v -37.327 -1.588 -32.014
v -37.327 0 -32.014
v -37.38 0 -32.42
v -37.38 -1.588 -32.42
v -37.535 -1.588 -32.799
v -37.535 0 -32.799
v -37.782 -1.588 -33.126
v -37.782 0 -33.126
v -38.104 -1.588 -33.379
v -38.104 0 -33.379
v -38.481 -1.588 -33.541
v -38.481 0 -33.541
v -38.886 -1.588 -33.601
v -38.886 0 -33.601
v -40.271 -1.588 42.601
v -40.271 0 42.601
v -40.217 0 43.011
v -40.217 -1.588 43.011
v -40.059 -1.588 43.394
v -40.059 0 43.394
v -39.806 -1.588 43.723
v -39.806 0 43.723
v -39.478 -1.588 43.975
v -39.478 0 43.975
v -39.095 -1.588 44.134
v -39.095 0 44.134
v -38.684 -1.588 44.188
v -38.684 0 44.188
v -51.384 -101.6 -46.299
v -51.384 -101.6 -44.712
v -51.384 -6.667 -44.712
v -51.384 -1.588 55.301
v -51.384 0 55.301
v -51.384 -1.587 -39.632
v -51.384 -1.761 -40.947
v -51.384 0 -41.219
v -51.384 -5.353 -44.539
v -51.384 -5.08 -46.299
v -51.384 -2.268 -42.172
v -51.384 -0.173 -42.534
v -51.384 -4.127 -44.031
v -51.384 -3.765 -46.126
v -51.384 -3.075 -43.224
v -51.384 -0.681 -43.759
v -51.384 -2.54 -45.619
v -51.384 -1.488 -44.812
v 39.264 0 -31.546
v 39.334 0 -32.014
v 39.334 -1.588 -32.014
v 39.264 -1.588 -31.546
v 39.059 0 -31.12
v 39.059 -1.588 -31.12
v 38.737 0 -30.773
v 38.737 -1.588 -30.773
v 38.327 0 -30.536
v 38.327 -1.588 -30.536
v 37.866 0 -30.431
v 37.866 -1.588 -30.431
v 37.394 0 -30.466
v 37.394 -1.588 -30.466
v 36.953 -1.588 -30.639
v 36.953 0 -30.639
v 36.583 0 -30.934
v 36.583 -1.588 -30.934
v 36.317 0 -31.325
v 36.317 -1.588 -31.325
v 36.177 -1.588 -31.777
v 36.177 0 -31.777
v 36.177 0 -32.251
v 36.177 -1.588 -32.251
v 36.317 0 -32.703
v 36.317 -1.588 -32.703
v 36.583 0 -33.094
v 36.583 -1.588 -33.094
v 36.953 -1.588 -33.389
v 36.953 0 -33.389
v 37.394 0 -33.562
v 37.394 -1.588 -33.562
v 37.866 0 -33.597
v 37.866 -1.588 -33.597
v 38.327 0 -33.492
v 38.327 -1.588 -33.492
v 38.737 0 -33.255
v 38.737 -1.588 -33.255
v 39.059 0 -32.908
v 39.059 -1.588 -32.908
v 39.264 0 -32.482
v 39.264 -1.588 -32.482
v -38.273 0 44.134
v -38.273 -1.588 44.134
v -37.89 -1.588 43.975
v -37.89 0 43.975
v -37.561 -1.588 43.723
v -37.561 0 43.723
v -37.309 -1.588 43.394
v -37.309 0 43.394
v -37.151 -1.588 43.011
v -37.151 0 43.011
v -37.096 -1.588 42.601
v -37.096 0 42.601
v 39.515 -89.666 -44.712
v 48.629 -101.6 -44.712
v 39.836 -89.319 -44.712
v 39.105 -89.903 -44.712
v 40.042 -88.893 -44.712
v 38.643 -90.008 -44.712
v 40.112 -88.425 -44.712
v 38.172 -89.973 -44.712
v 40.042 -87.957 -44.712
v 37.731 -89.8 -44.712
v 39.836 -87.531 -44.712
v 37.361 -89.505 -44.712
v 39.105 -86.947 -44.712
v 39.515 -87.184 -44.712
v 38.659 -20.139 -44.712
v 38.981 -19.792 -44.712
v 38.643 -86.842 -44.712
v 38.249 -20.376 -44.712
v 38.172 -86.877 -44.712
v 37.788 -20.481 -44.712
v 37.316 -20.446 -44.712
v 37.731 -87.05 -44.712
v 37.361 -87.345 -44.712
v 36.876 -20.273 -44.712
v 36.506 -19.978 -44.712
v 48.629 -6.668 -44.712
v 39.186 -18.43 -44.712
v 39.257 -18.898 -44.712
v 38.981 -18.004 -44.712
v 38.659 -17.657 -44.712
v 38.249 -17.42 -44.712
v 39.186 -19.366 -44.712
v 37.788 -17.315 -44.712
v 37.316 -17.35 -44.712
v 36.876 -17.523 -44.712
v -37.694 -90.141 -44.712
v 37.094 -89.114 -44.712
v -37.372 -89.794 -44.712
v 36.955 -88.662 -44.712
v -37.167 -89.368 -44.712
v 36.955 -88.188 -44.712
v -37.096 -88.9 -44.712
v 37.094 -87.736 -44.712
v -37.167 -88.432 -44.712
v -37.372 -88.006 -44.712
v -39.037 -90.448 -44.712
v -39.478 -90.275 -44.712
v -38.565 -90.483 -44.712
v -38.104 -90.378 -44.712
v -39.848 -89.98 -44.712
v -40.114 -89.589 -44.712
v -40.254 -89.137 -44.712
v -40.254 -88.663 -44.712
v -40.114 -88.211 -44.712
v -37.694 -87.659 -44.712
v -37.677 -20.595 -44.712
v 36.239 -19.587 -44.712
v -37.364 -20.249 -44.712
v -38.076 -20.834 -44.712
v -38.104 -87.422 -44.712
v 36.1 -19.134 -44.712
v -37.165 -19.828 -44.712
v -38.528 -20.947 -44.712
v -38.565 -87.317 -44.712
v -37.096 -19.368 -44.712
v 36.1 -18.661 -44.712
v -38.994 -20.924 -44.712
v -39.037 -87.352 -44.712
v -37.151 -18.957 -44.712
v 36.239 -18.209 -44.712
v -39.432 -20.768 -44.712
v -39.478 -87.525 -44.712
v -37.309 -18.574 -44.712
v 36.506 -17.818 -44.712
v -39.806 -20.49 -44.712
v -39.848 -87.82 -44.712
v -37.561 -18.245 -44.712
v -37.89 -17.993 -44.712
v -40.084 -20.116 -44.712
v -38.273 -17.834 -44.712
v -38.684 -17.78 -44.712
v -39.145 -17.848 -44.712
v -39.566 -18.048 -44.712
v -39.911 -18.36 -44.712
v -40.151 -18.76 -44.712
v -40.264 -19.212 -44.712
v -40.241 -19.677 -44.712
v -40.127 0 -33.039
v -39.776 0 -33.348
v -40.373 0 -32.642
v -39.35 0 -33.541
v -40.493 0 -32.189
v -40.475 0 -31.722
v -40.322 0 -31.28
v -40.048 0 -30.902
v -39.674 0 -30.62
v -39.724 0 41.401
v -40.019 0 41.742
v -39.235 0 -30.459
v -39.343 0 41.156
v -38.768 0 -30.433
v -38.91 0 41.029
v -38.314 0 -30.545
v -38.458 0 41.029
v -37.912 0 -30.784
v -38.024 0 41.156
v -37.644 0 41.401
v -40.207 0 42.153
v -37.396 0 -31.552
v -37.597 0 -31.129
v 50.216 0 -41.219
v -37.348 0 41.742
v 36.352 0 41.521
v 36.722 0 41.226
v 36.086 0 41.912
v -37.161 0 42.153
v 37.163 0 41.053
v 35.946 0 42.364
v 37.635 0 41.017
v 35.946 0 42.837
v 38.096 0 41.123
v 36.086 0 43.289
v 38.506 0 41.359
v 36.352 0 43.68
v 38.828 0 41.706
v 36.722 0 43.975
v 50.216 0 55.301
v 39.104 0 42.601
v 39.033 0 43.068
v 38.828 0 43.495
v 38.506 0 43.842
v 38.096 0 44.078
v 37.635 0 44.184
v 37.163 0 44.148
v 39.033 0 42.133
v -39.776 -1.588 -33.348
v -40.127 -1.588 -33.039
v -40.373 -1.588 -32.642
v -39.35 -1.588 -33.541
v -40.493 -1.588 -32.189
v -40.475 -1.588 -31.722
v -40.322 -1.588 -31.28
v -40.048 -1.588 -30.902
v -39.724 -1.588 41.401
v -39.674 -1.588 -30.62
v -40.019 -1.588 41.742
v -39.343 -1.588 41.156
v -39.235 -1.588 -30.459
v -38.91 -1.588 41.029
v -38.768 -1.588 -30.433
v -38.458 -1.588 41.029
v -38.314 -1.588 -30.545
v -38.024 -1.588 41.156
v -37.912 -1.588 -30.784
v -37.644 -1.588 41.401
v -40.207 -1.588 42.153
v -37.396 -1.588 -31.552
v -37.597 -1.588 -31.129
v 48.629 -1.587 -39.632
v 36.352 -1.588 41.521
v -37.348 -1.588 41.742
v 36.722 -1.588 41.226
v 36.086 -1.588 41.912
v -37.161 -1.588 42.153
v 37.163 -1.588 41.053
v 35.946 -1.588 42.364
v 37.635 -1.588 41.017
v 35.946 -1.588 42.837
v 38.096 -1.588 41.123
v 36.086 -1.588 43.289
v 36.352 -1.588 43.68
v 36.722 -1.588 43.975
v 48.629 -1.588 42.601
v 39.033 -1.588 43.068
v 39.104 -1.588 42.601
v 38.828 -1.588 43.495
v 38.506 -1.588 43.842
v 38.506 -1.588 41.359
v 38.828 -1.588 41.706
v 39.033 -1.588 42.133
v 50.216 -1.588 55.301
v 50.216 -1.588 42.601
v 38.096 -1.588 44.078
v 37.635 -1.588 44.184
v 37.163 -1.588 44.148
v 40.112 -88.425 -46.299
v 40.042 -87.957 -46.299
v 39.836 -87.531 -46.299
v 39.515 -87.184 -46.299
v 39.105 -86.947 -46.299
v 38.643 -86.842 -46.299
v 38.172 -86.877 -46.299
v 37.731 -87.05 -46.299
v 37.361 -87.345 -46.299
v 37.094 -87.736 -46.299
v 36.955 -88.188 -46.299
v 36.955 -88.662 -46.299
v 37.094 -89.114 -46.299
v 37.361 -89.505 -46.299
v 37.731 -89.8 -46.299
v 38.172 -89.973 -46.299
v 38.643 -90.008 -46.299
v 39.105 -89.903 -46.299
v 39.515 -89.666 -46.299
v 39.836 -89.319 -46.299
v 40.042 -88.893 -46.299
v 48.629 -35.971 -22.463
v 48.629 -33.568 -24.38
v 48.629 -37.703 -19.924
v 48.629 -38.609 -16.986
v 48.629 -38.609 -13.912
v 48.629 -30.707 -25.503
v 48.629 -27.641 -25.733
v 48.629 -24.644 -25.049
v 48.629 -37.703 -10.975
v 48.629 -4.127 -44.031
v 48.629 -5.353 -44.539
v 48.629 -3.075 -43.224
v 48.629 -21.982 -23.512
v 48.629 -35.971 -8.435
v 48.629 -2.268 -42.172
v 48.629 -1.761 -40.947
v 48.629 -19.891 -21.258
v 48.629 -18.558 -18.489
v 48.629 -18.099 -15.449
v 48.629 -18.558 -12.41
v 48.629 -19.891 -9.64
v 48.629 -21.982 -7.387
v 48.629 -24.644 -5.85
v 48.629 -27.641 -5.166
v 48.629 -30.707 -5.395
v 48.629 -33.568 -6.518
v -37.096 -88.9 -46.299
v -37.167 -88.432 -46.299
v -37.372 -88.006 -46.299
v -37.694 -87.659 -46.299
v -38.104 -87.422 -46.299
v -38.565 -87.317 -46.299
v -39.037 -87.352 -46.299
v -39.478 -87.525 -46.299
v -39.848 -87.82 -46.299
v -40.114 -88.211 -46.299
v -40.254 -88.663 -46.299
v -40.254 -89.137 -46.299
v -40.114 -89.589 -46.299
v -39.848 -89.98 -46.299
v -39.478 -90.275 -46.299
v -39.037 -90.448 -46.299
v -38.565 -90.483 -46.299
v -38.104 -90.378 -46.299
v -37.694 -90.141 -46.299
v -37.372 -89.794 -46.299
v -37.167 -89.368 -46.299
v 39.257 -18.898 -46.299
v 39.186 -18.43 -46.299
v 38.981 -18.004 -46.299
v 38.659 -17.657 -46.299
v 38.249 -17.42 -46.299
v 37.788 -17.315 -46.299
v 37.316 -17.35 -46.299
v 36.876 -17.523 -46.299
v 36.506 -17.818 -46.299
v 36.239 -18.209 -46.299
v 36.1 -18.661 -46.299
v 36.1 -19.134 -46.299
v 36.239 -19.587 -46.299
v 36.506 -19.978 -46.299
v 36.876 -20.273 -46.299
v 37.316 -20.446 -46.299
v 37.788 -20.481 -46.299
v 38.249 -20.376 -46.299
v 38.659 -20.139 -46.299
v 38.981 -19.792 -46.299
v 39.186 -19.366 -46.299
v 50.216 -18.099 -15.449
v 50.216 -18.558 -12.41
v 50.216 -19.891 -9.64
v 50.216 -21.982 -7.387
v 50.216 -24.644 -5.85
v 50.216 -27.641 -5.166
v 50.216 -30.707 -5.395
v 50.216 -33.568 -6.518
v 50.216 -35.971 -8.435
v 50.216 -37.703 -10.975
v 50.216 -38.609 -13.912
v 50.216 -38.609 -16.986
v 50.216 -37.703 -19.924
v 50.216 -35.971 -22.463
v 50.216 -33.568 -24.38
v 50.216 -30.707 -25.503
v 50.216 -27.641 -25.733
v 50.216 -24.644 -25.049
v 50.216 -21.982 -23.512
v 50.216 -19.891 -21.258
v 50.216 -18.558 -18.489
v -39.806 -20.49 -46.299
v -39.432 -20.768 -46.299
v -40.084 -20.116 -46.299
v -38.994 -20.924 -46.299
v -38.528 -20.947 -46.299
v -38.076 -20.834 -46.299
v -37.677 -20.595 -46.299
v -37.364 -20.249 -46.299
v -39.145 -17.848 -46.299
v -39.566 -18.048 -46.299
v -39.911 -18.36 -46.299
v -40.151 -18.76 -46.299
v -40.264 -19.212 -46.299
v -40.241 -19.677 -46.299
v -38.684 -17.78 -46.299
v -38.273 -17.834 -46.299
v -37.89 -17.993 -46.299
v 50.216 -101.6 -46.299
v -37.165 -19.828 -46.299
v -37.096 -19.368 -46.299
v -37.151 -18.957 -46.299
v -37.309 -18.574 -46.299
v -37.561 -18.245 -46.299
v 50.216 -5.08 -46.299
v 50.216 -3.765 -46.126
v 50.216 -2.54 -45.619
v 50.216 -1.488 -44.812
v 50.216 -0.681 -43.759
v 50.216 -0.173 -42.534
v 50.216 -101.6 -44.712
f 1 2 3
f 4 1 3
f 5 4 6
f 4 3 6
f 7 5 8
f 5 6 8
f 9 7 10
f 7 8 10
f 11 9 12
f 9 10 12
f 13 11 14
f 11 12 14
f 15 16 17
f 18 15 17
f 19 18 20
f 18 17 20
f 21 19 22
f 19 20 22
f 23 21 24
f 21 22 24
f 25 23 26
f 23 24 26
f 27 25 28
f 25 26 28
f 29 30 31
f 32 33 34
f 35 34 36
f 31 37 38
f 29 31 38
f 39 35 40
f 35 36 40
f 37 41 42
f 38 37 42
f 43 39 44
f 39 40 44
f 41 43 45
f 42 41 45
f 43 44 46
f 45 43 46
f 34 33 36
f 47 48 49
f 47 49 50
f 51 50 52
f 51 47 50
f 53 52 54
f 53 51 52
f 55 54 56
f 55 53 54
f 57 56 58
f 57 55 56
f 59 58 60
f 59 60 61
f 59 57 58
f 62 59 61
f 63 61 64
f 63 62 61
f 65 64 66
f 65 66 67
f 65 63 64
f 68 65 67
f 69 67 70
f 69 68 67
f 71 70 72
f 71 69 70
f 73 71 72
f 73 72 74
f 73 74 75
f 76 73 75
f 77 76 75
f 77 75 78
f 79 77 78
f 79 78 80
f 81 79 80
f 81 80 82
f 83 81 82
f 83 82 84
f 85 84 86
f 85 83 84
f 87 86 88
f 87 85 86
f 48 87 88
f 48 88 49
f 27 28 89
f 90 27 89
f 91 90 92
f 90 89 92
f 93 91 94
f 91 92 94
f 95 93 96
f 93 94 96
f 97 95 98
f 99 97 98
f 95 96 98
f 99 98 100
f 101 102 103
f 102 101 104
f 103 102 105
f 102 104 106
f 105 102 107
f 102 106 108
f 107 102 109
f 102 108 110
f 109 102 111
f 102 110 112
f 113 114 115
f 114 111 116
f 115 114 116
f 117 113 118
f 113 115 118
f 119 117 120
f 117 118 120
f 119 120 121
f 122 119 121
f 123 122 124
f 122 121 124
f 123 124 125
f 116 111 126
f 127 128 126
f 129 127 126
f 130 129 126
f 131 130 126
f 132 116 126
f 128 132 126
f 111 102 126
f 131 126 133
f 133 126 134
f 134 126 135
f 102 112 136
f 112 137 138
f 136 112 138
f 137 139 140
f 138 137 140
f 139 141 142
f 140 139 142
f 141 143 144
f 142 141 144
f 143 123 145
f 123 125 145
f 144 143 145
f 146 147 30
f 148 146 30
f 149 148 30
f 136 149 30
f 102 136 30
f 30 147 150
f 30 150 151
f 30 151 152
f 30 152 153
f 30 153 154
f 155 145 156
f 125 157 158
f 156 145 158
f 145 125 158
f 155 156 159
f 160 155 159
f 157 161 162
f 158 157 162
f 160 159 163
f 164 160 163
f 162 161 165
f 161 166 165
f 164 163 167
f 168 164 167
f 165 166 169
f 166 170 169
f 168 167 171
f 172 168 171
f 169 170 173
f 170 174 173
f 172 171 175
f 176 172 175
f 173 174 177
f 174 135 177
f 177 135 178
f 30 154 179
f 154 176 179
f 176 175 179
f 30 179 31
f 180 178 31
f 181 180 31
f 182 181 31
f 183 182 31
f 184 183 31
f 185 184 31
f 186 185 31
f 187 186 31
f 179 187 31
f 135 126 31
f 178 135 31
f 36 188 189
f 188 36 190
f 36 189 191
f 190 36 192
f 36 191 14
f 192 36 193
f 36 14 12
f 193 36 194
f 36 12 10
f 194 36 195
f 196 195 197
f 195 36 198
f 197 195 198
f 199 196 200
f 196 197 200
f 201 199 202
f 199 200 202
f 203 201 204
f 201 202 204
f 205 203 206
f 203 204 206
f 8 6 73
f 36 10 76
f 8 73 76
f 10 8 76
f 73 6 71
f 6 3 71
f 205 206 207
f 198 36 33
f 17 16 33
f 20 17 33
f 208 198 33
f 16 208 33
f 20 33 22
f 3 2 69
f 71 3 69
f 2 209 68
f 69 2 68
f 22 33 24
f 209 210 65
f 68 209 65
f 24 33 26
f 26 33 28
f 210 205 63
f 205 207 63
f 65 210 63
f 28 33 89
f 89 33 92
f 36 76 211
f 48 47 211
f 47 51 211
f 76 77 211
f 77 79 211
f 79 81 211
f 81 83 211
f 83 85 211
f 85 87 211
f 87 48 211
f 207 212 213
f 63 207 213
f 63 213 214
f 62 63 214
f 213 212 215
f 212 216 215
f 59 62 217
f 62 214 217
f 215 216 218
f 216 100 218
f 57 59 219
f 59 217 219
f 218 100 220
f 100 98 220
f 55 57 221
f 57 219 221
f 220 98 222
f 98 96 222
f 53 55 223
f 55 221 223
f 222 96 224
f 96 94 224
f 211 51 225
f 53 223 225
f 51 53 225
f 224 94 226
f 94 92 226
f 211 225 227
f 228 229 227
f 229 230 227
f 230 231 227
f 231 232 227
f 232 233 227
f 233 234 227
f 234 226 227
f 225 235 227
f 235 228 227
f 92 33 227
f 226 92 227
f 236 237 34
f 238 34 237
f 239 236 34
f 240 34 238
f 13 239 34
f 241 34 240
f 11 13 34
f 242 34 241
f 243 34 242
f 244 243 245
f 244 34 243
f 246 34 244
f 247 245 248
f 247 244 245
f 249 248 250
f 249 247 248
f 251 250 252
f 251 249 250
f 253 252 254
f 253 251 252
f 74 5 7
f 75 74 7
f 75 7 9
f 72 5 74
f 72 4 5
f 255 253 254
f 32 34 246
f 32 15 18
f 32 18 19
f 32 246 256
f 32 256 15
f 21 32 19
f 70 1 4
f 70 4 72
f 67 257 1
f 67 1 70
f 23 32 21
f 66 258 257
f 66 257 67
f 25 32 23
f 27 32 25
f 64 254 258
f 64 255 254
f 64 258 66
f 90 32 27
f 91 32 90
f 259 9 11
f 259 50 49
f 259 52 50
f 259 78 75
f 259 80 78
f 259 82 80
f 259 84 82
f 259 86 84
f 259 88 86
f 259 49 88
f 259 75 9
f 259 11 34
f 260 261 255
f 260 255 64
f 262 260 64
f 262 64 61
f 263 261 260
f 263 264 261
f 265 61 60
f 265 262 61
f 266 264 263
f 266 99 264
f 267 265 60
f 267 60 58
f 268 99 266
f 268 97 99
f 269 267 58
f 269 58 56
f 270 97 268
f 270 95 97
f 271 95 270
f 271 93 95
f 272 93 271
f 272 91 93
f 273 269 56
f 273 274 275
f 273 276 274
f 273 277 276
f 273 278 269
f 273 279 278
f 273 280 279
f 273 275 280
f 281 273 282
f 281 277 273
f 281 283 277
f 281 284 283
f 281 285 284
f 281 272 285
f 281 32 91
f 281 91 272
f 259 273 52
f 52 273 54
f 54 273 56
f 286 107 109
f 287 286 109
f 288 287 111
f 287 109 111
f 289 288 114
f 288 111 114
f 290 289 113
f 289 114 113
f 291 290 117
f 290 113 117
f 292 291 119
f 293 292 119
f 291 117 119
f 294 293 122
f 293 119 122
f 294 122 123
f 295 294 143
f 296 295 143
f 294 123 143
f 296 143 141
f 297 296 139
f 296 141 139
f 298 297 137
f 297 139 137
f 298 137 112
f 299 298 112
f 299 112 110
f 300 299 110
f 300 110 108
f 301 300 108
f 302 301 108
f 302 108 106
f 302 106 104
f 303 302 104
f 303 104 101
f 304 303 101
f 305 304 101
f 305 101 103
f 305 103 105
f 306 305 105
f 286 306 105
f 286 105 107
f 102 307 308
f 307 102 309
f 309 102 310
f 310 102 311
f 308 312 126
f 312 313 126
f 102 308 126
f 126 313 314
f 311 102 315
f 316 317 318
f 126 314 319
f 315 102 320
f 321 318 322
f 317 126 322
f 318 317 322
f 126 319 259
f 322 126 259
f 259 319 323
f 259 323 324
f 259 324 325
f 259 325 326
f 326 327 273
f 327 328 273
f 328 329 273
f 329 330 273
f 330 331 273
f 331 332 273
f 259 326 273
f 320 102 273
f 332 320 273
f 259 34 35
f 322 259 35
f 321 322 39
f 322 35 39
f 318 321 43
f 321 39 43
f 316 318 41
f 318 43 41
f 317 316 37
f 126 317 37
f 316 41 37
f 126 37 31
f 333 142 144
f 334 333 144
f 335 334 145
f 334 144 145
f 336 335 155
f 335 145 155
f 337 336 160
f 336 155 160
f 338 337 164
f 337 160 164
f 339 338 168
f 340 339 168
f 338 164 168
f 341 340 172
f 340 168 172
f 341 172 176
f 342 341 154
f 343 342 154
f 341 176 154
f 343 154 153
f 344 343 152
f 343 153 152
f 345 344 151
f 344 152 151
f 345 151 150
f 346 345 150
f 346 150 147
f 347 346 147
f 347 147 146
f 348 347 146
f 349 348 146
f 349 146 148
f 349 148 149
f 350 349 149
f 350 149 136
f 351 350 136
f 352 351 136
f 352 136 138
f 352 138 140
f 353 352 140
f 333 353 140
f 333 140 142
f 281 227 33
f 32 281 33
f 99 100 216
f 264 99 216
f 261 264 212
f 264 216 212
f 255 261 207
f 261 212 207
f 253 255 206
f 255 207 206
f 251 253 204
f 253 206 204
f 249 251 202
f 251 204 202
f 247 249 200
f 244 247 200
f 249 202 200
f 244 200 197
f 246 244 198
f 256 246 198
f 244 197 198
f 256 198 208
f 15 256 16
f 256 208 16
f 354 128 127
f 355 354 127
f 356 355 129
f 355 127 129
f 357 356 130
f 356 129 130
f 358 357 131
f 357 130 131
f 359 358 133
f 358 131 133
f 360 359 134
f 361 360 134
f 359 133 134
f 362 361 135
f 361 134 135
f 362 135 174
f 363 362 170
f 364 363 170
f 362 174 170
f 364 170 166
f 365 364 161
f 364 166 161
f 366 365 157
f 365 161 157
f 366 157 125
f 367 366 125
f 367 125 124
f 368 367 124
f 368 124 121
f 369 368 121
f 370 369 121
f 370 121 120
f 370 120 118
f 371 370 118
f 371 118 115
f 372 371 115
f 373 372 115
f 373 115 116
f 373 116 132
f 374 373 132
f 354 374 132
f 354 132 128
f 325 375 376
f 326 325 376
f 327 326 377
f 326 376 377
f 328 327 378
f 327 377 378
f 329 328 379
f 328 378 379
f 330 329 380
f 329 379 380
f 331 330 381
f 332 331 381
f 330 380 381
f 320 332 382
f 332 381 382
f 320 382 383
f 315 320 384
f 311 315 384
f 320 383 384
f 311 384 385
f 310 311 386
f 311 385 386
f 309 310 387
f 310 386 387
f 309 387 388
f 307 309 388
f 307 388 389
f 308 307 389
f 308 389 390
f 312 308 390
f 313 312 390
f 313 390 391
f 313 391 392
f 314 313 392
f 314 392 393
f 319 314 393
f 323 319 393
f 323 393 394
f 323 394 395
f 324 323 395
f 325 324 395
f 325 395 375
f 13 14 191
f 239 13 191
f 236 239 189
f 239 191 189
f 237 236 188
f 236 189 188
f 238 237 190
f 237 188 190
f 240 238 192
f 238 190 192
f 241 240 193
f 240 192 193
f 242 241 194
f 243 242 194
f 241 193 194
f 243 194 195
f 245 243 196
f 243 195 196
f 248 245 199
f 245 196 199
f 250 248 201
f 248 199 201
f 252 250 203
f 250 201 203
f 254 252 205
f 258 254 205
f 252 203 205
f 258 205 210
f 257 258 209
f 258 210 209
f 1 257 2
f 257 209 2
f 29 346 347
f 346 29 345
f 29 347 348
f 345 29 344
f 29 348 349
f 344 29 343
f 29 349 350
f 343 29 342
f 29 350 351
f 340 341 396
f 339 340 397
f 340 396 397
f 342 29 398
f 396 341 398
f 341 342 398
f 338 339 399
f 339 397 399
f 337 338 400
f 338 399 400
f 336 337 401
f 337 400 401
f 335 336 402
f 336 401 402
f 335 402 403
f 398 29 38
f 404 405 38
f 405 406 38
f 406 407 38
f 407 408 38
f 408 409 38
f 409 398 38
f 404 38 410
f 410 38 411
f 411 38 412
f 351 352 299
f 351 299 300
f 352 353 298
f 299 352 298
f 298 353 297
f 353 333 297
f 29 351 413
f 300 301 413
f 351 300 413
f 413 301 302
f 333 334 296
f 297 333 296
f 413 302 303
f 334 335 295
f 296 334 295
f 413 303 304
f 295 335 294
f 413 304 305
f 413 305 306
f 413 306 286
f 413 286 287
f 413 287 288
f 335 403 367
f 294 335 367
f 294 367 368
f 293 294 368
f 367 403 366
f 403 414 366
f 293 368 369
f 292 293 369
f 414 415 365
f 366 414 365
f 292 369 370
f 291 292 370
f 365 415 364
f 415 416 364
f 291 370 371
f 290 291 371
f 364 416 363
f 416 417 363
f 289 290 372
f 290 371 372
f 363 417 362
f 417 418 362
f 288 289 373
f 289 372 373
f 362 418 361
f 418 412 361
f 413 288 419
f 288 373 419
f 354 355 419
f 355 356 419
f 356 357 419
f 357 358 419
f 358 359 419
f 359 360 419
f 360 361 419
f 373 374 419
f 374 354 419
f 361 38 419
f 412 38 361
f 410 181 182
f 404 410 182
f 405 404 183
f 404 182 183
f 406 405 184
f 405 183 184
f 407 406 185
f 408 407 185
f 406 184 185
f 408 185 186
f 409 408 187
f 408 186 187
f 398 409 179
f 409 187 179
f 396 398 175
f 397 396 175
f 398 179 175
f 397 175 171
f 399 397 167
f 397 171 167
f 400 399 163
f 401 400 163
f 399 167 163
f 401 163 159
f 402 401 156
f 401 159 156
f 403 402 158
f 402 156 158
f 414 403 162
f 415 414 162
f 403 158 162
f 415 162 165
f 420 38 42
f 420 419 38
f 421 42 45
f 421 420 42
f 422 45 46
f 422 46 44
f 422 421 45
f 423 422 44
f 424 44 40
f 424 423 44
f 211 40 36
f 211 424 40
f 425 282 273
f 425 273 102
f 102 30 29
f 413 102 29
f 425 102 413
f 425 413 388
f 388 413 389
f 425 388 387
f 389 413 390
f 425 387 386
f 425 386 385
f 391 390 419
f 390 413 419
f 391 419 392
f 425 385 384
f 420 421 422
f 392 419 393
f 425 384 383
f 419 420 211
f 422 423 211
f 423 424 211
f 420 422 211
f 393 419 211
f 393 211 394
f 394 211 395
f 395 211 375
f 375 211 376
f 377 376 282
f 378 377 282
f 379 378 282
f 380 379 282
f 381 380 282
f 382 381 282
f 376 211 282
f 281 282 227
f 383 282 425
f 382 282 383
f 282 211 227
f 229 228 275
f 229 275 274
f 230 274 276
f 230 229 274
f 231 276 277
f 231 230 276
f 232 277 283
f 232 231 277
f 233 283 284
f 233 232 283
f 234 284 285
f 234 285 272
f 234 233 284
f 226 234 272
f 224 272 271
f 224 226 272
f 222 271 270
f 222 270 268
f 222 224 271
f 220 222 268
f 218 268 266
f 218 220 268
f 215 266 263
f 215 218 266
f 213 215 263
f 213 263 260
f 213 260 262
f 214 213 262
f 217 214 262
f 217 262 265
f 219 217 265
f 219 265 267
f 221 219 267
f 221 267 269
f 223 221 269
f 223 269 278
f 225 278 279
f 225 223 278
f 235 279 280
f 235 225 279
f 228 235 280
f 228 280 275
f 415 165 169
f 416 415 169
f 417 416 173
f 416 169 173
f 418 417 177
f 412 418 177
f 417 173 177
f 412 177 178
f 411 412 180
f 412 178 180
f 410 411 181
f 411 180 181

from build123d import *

# Parameters (mm, degrees)
F1_DEPTH  = 101.6
F0_W      = 50.8
F0_H      = 100.0125
F0_R      = 1.5875
F2_DEPTH  = 1.5875
F4_DEPTH  = 1.5875
F5_R      = 5.08
F6_R      = 5.08
F7_R      = 1.5875
F8_DEPTH  = 25.4
F10_R     = 10.3124
F11_DEPTH = 25.4


with BuildPart() as f1:
    # F0 (on Front) → F1 (new body)
    with BuildSketch(Plane.XZ):
        Polygon((-38.6839361429, -44.711994803), (-51.3839361429, -44.711994803), (-51.3839361429, -46.299494803), (50.2160638571, -46.299494803), (50.2160638571, -44.711994803), (-0.5839361429, -44.711994803), align=None)
    extrude(amount=F1_DEPTH)

    # F0 (on Front) → F2 (join)
    with BuildSketch(Plane.XZ):
        with BuildLine():
            Line((-38.6839361429, 55.300505197), (-51.3839361429, 55.300505197))
            Line((-51.3839361429, 55.300505197), (-51.3839361429, 42.600505197))
            Line((-51.3839361429, 42.600505197), (-40.2714361429, 42.600505197))
            ThreePointArc((-40.2714361429, 42.600505197), (-39.8064681581, 43.7230372122), (-38.6839361429, 44.188005197))
            Line((-38.6839361429, 44.188005197), (-38.6839361429, 55.300505197))
        make_face()
        with BuildLine():
            Line((-0.5839361429, 55.300505197), (-38.6839361429, 55.300505197))
            Line((-38.6839361429, 55.300505197), (-38.6839361429, 44.188005197))
            ThreePointArc((-38.6839361429, 44.188005197), (-37.5614041278, 43.7230372122), (-37.0964361429, 42.600505197))
            ThreePointArc((-37.0964361429, 42.600505197), (-38.6839361429, 41.013005197), (-40.2714361429, 42.600505197))
            Line((-40.2714361429, 42.600505197), (-51.3839361429, 42.600505197))
            Line((-51.3839361429, 42.600505197), (-51.3839361429, -44.711994803))
            Line((-51.3839361429, -44.711994803), (-38.6839361429, -44.711994803))
            Line((-38.6839361429, -44.711994803), (-0.5839361429, -44.711994803))
            Line((-0.5839361429, -44.711994803), (-0.5839361429, 55.300505197))
        make_face()
        with BuildLine():
            ThreePointArc((-37.3273452338, -32.01409415), (-37.7821543509, -33.1263745165), (-38.8859815975, -33.6013317316))
            ThreePointArc((-38.8859815975, -33.6013317316), (-40.0475361168, -30.9018137835), (-37.3273452338, -32.01409415))
        make_face(mode=Mode.SUBTRACT)
        with Locations((24.8160638571, 5.294255197)):
            Rectangle(F0_W, F0_H)
        with Locations((37.746972948, -32.01409415)):
            Circle(F0_R, mode=Mode.SUBTRACT)
        with Locations((37.5160638571, 42.600505197)):
            Circle(F0_R, mode=Mode.SUBTRACT)
        Polygon((-38.6839361429, -44.711994803), (-51.3839361429, -44.711994803), (-51.3839361429, -46.299494803), (50.2160638571, -46.299494803), (50.2160638571, -44.711994803), (-0.5839361429, -44.711994803), align=None)
    extrude(amount=F2_DEPTH)

    # F5
    f5_edges = [f1.edges().sort_by_distance(p)[0] for p in [
        (-0.583936, 0, -46.299495),
    ]]
    fillet(f5_edges, radius=F5_R)

    # F6
    f6_edges = [f1.edges().sort_by_distance(p)[0] for p in [
        (-0.583936, -1.5875, -44.711995),
    ]]
    fillet(f6_edges, radius=F6_R)

    # F7 (on face) → F8 (cut)
    with BuildSketch(Plane.XY.offset(-44.711994803)):
        with BuildLine():
            ThreePointArc((-38.6839361429, -17.78), (-39.8064681581, -20.4900320151), (-37.0964361429, -19.3675))
            ThreePointArc((-37.0964361429, -19.3675), (-37.5614041278, -18.2449679849), (-38.6839361429, -17.78))
        make_face()
        with Locations((-38.6839361429, -88.9)):
            Circle(F7_R)
        with Locations((37.6694120758, -18.8978454596)):
            Circle(F7_R)
        with Locations((38.5247778081, -88.4250840479)):
            Circle(F7_R)
    extrude(amount=-F8_DEPTH, mode=Mode.SUBTRACT)


with BuildPart() as f4:
    # F3 (on face) → F4 (new body)
    with BuildSketch(Plane.YZ.offset(50.2160638571)):
        Polygon((-1.5875, -44.711994803), (-1.5875, 42.600505197), (-101.6, -44.711994803), align=None)
    extrude(amount=-F4_DEPTH)

    # F9: union F1
    add(f1.part)

    # F10 (on face) → F11 (cut)
    with BuildSketch(Plane.YZ.offset(50.2160638571)):
        with Locations((-28.4118975516, -15.4491972514)):
            Circle(F10_R)
    extrude(amount=-F11_DEPTH, mode=Mode.SUBTRACT)


solid = f4.part
